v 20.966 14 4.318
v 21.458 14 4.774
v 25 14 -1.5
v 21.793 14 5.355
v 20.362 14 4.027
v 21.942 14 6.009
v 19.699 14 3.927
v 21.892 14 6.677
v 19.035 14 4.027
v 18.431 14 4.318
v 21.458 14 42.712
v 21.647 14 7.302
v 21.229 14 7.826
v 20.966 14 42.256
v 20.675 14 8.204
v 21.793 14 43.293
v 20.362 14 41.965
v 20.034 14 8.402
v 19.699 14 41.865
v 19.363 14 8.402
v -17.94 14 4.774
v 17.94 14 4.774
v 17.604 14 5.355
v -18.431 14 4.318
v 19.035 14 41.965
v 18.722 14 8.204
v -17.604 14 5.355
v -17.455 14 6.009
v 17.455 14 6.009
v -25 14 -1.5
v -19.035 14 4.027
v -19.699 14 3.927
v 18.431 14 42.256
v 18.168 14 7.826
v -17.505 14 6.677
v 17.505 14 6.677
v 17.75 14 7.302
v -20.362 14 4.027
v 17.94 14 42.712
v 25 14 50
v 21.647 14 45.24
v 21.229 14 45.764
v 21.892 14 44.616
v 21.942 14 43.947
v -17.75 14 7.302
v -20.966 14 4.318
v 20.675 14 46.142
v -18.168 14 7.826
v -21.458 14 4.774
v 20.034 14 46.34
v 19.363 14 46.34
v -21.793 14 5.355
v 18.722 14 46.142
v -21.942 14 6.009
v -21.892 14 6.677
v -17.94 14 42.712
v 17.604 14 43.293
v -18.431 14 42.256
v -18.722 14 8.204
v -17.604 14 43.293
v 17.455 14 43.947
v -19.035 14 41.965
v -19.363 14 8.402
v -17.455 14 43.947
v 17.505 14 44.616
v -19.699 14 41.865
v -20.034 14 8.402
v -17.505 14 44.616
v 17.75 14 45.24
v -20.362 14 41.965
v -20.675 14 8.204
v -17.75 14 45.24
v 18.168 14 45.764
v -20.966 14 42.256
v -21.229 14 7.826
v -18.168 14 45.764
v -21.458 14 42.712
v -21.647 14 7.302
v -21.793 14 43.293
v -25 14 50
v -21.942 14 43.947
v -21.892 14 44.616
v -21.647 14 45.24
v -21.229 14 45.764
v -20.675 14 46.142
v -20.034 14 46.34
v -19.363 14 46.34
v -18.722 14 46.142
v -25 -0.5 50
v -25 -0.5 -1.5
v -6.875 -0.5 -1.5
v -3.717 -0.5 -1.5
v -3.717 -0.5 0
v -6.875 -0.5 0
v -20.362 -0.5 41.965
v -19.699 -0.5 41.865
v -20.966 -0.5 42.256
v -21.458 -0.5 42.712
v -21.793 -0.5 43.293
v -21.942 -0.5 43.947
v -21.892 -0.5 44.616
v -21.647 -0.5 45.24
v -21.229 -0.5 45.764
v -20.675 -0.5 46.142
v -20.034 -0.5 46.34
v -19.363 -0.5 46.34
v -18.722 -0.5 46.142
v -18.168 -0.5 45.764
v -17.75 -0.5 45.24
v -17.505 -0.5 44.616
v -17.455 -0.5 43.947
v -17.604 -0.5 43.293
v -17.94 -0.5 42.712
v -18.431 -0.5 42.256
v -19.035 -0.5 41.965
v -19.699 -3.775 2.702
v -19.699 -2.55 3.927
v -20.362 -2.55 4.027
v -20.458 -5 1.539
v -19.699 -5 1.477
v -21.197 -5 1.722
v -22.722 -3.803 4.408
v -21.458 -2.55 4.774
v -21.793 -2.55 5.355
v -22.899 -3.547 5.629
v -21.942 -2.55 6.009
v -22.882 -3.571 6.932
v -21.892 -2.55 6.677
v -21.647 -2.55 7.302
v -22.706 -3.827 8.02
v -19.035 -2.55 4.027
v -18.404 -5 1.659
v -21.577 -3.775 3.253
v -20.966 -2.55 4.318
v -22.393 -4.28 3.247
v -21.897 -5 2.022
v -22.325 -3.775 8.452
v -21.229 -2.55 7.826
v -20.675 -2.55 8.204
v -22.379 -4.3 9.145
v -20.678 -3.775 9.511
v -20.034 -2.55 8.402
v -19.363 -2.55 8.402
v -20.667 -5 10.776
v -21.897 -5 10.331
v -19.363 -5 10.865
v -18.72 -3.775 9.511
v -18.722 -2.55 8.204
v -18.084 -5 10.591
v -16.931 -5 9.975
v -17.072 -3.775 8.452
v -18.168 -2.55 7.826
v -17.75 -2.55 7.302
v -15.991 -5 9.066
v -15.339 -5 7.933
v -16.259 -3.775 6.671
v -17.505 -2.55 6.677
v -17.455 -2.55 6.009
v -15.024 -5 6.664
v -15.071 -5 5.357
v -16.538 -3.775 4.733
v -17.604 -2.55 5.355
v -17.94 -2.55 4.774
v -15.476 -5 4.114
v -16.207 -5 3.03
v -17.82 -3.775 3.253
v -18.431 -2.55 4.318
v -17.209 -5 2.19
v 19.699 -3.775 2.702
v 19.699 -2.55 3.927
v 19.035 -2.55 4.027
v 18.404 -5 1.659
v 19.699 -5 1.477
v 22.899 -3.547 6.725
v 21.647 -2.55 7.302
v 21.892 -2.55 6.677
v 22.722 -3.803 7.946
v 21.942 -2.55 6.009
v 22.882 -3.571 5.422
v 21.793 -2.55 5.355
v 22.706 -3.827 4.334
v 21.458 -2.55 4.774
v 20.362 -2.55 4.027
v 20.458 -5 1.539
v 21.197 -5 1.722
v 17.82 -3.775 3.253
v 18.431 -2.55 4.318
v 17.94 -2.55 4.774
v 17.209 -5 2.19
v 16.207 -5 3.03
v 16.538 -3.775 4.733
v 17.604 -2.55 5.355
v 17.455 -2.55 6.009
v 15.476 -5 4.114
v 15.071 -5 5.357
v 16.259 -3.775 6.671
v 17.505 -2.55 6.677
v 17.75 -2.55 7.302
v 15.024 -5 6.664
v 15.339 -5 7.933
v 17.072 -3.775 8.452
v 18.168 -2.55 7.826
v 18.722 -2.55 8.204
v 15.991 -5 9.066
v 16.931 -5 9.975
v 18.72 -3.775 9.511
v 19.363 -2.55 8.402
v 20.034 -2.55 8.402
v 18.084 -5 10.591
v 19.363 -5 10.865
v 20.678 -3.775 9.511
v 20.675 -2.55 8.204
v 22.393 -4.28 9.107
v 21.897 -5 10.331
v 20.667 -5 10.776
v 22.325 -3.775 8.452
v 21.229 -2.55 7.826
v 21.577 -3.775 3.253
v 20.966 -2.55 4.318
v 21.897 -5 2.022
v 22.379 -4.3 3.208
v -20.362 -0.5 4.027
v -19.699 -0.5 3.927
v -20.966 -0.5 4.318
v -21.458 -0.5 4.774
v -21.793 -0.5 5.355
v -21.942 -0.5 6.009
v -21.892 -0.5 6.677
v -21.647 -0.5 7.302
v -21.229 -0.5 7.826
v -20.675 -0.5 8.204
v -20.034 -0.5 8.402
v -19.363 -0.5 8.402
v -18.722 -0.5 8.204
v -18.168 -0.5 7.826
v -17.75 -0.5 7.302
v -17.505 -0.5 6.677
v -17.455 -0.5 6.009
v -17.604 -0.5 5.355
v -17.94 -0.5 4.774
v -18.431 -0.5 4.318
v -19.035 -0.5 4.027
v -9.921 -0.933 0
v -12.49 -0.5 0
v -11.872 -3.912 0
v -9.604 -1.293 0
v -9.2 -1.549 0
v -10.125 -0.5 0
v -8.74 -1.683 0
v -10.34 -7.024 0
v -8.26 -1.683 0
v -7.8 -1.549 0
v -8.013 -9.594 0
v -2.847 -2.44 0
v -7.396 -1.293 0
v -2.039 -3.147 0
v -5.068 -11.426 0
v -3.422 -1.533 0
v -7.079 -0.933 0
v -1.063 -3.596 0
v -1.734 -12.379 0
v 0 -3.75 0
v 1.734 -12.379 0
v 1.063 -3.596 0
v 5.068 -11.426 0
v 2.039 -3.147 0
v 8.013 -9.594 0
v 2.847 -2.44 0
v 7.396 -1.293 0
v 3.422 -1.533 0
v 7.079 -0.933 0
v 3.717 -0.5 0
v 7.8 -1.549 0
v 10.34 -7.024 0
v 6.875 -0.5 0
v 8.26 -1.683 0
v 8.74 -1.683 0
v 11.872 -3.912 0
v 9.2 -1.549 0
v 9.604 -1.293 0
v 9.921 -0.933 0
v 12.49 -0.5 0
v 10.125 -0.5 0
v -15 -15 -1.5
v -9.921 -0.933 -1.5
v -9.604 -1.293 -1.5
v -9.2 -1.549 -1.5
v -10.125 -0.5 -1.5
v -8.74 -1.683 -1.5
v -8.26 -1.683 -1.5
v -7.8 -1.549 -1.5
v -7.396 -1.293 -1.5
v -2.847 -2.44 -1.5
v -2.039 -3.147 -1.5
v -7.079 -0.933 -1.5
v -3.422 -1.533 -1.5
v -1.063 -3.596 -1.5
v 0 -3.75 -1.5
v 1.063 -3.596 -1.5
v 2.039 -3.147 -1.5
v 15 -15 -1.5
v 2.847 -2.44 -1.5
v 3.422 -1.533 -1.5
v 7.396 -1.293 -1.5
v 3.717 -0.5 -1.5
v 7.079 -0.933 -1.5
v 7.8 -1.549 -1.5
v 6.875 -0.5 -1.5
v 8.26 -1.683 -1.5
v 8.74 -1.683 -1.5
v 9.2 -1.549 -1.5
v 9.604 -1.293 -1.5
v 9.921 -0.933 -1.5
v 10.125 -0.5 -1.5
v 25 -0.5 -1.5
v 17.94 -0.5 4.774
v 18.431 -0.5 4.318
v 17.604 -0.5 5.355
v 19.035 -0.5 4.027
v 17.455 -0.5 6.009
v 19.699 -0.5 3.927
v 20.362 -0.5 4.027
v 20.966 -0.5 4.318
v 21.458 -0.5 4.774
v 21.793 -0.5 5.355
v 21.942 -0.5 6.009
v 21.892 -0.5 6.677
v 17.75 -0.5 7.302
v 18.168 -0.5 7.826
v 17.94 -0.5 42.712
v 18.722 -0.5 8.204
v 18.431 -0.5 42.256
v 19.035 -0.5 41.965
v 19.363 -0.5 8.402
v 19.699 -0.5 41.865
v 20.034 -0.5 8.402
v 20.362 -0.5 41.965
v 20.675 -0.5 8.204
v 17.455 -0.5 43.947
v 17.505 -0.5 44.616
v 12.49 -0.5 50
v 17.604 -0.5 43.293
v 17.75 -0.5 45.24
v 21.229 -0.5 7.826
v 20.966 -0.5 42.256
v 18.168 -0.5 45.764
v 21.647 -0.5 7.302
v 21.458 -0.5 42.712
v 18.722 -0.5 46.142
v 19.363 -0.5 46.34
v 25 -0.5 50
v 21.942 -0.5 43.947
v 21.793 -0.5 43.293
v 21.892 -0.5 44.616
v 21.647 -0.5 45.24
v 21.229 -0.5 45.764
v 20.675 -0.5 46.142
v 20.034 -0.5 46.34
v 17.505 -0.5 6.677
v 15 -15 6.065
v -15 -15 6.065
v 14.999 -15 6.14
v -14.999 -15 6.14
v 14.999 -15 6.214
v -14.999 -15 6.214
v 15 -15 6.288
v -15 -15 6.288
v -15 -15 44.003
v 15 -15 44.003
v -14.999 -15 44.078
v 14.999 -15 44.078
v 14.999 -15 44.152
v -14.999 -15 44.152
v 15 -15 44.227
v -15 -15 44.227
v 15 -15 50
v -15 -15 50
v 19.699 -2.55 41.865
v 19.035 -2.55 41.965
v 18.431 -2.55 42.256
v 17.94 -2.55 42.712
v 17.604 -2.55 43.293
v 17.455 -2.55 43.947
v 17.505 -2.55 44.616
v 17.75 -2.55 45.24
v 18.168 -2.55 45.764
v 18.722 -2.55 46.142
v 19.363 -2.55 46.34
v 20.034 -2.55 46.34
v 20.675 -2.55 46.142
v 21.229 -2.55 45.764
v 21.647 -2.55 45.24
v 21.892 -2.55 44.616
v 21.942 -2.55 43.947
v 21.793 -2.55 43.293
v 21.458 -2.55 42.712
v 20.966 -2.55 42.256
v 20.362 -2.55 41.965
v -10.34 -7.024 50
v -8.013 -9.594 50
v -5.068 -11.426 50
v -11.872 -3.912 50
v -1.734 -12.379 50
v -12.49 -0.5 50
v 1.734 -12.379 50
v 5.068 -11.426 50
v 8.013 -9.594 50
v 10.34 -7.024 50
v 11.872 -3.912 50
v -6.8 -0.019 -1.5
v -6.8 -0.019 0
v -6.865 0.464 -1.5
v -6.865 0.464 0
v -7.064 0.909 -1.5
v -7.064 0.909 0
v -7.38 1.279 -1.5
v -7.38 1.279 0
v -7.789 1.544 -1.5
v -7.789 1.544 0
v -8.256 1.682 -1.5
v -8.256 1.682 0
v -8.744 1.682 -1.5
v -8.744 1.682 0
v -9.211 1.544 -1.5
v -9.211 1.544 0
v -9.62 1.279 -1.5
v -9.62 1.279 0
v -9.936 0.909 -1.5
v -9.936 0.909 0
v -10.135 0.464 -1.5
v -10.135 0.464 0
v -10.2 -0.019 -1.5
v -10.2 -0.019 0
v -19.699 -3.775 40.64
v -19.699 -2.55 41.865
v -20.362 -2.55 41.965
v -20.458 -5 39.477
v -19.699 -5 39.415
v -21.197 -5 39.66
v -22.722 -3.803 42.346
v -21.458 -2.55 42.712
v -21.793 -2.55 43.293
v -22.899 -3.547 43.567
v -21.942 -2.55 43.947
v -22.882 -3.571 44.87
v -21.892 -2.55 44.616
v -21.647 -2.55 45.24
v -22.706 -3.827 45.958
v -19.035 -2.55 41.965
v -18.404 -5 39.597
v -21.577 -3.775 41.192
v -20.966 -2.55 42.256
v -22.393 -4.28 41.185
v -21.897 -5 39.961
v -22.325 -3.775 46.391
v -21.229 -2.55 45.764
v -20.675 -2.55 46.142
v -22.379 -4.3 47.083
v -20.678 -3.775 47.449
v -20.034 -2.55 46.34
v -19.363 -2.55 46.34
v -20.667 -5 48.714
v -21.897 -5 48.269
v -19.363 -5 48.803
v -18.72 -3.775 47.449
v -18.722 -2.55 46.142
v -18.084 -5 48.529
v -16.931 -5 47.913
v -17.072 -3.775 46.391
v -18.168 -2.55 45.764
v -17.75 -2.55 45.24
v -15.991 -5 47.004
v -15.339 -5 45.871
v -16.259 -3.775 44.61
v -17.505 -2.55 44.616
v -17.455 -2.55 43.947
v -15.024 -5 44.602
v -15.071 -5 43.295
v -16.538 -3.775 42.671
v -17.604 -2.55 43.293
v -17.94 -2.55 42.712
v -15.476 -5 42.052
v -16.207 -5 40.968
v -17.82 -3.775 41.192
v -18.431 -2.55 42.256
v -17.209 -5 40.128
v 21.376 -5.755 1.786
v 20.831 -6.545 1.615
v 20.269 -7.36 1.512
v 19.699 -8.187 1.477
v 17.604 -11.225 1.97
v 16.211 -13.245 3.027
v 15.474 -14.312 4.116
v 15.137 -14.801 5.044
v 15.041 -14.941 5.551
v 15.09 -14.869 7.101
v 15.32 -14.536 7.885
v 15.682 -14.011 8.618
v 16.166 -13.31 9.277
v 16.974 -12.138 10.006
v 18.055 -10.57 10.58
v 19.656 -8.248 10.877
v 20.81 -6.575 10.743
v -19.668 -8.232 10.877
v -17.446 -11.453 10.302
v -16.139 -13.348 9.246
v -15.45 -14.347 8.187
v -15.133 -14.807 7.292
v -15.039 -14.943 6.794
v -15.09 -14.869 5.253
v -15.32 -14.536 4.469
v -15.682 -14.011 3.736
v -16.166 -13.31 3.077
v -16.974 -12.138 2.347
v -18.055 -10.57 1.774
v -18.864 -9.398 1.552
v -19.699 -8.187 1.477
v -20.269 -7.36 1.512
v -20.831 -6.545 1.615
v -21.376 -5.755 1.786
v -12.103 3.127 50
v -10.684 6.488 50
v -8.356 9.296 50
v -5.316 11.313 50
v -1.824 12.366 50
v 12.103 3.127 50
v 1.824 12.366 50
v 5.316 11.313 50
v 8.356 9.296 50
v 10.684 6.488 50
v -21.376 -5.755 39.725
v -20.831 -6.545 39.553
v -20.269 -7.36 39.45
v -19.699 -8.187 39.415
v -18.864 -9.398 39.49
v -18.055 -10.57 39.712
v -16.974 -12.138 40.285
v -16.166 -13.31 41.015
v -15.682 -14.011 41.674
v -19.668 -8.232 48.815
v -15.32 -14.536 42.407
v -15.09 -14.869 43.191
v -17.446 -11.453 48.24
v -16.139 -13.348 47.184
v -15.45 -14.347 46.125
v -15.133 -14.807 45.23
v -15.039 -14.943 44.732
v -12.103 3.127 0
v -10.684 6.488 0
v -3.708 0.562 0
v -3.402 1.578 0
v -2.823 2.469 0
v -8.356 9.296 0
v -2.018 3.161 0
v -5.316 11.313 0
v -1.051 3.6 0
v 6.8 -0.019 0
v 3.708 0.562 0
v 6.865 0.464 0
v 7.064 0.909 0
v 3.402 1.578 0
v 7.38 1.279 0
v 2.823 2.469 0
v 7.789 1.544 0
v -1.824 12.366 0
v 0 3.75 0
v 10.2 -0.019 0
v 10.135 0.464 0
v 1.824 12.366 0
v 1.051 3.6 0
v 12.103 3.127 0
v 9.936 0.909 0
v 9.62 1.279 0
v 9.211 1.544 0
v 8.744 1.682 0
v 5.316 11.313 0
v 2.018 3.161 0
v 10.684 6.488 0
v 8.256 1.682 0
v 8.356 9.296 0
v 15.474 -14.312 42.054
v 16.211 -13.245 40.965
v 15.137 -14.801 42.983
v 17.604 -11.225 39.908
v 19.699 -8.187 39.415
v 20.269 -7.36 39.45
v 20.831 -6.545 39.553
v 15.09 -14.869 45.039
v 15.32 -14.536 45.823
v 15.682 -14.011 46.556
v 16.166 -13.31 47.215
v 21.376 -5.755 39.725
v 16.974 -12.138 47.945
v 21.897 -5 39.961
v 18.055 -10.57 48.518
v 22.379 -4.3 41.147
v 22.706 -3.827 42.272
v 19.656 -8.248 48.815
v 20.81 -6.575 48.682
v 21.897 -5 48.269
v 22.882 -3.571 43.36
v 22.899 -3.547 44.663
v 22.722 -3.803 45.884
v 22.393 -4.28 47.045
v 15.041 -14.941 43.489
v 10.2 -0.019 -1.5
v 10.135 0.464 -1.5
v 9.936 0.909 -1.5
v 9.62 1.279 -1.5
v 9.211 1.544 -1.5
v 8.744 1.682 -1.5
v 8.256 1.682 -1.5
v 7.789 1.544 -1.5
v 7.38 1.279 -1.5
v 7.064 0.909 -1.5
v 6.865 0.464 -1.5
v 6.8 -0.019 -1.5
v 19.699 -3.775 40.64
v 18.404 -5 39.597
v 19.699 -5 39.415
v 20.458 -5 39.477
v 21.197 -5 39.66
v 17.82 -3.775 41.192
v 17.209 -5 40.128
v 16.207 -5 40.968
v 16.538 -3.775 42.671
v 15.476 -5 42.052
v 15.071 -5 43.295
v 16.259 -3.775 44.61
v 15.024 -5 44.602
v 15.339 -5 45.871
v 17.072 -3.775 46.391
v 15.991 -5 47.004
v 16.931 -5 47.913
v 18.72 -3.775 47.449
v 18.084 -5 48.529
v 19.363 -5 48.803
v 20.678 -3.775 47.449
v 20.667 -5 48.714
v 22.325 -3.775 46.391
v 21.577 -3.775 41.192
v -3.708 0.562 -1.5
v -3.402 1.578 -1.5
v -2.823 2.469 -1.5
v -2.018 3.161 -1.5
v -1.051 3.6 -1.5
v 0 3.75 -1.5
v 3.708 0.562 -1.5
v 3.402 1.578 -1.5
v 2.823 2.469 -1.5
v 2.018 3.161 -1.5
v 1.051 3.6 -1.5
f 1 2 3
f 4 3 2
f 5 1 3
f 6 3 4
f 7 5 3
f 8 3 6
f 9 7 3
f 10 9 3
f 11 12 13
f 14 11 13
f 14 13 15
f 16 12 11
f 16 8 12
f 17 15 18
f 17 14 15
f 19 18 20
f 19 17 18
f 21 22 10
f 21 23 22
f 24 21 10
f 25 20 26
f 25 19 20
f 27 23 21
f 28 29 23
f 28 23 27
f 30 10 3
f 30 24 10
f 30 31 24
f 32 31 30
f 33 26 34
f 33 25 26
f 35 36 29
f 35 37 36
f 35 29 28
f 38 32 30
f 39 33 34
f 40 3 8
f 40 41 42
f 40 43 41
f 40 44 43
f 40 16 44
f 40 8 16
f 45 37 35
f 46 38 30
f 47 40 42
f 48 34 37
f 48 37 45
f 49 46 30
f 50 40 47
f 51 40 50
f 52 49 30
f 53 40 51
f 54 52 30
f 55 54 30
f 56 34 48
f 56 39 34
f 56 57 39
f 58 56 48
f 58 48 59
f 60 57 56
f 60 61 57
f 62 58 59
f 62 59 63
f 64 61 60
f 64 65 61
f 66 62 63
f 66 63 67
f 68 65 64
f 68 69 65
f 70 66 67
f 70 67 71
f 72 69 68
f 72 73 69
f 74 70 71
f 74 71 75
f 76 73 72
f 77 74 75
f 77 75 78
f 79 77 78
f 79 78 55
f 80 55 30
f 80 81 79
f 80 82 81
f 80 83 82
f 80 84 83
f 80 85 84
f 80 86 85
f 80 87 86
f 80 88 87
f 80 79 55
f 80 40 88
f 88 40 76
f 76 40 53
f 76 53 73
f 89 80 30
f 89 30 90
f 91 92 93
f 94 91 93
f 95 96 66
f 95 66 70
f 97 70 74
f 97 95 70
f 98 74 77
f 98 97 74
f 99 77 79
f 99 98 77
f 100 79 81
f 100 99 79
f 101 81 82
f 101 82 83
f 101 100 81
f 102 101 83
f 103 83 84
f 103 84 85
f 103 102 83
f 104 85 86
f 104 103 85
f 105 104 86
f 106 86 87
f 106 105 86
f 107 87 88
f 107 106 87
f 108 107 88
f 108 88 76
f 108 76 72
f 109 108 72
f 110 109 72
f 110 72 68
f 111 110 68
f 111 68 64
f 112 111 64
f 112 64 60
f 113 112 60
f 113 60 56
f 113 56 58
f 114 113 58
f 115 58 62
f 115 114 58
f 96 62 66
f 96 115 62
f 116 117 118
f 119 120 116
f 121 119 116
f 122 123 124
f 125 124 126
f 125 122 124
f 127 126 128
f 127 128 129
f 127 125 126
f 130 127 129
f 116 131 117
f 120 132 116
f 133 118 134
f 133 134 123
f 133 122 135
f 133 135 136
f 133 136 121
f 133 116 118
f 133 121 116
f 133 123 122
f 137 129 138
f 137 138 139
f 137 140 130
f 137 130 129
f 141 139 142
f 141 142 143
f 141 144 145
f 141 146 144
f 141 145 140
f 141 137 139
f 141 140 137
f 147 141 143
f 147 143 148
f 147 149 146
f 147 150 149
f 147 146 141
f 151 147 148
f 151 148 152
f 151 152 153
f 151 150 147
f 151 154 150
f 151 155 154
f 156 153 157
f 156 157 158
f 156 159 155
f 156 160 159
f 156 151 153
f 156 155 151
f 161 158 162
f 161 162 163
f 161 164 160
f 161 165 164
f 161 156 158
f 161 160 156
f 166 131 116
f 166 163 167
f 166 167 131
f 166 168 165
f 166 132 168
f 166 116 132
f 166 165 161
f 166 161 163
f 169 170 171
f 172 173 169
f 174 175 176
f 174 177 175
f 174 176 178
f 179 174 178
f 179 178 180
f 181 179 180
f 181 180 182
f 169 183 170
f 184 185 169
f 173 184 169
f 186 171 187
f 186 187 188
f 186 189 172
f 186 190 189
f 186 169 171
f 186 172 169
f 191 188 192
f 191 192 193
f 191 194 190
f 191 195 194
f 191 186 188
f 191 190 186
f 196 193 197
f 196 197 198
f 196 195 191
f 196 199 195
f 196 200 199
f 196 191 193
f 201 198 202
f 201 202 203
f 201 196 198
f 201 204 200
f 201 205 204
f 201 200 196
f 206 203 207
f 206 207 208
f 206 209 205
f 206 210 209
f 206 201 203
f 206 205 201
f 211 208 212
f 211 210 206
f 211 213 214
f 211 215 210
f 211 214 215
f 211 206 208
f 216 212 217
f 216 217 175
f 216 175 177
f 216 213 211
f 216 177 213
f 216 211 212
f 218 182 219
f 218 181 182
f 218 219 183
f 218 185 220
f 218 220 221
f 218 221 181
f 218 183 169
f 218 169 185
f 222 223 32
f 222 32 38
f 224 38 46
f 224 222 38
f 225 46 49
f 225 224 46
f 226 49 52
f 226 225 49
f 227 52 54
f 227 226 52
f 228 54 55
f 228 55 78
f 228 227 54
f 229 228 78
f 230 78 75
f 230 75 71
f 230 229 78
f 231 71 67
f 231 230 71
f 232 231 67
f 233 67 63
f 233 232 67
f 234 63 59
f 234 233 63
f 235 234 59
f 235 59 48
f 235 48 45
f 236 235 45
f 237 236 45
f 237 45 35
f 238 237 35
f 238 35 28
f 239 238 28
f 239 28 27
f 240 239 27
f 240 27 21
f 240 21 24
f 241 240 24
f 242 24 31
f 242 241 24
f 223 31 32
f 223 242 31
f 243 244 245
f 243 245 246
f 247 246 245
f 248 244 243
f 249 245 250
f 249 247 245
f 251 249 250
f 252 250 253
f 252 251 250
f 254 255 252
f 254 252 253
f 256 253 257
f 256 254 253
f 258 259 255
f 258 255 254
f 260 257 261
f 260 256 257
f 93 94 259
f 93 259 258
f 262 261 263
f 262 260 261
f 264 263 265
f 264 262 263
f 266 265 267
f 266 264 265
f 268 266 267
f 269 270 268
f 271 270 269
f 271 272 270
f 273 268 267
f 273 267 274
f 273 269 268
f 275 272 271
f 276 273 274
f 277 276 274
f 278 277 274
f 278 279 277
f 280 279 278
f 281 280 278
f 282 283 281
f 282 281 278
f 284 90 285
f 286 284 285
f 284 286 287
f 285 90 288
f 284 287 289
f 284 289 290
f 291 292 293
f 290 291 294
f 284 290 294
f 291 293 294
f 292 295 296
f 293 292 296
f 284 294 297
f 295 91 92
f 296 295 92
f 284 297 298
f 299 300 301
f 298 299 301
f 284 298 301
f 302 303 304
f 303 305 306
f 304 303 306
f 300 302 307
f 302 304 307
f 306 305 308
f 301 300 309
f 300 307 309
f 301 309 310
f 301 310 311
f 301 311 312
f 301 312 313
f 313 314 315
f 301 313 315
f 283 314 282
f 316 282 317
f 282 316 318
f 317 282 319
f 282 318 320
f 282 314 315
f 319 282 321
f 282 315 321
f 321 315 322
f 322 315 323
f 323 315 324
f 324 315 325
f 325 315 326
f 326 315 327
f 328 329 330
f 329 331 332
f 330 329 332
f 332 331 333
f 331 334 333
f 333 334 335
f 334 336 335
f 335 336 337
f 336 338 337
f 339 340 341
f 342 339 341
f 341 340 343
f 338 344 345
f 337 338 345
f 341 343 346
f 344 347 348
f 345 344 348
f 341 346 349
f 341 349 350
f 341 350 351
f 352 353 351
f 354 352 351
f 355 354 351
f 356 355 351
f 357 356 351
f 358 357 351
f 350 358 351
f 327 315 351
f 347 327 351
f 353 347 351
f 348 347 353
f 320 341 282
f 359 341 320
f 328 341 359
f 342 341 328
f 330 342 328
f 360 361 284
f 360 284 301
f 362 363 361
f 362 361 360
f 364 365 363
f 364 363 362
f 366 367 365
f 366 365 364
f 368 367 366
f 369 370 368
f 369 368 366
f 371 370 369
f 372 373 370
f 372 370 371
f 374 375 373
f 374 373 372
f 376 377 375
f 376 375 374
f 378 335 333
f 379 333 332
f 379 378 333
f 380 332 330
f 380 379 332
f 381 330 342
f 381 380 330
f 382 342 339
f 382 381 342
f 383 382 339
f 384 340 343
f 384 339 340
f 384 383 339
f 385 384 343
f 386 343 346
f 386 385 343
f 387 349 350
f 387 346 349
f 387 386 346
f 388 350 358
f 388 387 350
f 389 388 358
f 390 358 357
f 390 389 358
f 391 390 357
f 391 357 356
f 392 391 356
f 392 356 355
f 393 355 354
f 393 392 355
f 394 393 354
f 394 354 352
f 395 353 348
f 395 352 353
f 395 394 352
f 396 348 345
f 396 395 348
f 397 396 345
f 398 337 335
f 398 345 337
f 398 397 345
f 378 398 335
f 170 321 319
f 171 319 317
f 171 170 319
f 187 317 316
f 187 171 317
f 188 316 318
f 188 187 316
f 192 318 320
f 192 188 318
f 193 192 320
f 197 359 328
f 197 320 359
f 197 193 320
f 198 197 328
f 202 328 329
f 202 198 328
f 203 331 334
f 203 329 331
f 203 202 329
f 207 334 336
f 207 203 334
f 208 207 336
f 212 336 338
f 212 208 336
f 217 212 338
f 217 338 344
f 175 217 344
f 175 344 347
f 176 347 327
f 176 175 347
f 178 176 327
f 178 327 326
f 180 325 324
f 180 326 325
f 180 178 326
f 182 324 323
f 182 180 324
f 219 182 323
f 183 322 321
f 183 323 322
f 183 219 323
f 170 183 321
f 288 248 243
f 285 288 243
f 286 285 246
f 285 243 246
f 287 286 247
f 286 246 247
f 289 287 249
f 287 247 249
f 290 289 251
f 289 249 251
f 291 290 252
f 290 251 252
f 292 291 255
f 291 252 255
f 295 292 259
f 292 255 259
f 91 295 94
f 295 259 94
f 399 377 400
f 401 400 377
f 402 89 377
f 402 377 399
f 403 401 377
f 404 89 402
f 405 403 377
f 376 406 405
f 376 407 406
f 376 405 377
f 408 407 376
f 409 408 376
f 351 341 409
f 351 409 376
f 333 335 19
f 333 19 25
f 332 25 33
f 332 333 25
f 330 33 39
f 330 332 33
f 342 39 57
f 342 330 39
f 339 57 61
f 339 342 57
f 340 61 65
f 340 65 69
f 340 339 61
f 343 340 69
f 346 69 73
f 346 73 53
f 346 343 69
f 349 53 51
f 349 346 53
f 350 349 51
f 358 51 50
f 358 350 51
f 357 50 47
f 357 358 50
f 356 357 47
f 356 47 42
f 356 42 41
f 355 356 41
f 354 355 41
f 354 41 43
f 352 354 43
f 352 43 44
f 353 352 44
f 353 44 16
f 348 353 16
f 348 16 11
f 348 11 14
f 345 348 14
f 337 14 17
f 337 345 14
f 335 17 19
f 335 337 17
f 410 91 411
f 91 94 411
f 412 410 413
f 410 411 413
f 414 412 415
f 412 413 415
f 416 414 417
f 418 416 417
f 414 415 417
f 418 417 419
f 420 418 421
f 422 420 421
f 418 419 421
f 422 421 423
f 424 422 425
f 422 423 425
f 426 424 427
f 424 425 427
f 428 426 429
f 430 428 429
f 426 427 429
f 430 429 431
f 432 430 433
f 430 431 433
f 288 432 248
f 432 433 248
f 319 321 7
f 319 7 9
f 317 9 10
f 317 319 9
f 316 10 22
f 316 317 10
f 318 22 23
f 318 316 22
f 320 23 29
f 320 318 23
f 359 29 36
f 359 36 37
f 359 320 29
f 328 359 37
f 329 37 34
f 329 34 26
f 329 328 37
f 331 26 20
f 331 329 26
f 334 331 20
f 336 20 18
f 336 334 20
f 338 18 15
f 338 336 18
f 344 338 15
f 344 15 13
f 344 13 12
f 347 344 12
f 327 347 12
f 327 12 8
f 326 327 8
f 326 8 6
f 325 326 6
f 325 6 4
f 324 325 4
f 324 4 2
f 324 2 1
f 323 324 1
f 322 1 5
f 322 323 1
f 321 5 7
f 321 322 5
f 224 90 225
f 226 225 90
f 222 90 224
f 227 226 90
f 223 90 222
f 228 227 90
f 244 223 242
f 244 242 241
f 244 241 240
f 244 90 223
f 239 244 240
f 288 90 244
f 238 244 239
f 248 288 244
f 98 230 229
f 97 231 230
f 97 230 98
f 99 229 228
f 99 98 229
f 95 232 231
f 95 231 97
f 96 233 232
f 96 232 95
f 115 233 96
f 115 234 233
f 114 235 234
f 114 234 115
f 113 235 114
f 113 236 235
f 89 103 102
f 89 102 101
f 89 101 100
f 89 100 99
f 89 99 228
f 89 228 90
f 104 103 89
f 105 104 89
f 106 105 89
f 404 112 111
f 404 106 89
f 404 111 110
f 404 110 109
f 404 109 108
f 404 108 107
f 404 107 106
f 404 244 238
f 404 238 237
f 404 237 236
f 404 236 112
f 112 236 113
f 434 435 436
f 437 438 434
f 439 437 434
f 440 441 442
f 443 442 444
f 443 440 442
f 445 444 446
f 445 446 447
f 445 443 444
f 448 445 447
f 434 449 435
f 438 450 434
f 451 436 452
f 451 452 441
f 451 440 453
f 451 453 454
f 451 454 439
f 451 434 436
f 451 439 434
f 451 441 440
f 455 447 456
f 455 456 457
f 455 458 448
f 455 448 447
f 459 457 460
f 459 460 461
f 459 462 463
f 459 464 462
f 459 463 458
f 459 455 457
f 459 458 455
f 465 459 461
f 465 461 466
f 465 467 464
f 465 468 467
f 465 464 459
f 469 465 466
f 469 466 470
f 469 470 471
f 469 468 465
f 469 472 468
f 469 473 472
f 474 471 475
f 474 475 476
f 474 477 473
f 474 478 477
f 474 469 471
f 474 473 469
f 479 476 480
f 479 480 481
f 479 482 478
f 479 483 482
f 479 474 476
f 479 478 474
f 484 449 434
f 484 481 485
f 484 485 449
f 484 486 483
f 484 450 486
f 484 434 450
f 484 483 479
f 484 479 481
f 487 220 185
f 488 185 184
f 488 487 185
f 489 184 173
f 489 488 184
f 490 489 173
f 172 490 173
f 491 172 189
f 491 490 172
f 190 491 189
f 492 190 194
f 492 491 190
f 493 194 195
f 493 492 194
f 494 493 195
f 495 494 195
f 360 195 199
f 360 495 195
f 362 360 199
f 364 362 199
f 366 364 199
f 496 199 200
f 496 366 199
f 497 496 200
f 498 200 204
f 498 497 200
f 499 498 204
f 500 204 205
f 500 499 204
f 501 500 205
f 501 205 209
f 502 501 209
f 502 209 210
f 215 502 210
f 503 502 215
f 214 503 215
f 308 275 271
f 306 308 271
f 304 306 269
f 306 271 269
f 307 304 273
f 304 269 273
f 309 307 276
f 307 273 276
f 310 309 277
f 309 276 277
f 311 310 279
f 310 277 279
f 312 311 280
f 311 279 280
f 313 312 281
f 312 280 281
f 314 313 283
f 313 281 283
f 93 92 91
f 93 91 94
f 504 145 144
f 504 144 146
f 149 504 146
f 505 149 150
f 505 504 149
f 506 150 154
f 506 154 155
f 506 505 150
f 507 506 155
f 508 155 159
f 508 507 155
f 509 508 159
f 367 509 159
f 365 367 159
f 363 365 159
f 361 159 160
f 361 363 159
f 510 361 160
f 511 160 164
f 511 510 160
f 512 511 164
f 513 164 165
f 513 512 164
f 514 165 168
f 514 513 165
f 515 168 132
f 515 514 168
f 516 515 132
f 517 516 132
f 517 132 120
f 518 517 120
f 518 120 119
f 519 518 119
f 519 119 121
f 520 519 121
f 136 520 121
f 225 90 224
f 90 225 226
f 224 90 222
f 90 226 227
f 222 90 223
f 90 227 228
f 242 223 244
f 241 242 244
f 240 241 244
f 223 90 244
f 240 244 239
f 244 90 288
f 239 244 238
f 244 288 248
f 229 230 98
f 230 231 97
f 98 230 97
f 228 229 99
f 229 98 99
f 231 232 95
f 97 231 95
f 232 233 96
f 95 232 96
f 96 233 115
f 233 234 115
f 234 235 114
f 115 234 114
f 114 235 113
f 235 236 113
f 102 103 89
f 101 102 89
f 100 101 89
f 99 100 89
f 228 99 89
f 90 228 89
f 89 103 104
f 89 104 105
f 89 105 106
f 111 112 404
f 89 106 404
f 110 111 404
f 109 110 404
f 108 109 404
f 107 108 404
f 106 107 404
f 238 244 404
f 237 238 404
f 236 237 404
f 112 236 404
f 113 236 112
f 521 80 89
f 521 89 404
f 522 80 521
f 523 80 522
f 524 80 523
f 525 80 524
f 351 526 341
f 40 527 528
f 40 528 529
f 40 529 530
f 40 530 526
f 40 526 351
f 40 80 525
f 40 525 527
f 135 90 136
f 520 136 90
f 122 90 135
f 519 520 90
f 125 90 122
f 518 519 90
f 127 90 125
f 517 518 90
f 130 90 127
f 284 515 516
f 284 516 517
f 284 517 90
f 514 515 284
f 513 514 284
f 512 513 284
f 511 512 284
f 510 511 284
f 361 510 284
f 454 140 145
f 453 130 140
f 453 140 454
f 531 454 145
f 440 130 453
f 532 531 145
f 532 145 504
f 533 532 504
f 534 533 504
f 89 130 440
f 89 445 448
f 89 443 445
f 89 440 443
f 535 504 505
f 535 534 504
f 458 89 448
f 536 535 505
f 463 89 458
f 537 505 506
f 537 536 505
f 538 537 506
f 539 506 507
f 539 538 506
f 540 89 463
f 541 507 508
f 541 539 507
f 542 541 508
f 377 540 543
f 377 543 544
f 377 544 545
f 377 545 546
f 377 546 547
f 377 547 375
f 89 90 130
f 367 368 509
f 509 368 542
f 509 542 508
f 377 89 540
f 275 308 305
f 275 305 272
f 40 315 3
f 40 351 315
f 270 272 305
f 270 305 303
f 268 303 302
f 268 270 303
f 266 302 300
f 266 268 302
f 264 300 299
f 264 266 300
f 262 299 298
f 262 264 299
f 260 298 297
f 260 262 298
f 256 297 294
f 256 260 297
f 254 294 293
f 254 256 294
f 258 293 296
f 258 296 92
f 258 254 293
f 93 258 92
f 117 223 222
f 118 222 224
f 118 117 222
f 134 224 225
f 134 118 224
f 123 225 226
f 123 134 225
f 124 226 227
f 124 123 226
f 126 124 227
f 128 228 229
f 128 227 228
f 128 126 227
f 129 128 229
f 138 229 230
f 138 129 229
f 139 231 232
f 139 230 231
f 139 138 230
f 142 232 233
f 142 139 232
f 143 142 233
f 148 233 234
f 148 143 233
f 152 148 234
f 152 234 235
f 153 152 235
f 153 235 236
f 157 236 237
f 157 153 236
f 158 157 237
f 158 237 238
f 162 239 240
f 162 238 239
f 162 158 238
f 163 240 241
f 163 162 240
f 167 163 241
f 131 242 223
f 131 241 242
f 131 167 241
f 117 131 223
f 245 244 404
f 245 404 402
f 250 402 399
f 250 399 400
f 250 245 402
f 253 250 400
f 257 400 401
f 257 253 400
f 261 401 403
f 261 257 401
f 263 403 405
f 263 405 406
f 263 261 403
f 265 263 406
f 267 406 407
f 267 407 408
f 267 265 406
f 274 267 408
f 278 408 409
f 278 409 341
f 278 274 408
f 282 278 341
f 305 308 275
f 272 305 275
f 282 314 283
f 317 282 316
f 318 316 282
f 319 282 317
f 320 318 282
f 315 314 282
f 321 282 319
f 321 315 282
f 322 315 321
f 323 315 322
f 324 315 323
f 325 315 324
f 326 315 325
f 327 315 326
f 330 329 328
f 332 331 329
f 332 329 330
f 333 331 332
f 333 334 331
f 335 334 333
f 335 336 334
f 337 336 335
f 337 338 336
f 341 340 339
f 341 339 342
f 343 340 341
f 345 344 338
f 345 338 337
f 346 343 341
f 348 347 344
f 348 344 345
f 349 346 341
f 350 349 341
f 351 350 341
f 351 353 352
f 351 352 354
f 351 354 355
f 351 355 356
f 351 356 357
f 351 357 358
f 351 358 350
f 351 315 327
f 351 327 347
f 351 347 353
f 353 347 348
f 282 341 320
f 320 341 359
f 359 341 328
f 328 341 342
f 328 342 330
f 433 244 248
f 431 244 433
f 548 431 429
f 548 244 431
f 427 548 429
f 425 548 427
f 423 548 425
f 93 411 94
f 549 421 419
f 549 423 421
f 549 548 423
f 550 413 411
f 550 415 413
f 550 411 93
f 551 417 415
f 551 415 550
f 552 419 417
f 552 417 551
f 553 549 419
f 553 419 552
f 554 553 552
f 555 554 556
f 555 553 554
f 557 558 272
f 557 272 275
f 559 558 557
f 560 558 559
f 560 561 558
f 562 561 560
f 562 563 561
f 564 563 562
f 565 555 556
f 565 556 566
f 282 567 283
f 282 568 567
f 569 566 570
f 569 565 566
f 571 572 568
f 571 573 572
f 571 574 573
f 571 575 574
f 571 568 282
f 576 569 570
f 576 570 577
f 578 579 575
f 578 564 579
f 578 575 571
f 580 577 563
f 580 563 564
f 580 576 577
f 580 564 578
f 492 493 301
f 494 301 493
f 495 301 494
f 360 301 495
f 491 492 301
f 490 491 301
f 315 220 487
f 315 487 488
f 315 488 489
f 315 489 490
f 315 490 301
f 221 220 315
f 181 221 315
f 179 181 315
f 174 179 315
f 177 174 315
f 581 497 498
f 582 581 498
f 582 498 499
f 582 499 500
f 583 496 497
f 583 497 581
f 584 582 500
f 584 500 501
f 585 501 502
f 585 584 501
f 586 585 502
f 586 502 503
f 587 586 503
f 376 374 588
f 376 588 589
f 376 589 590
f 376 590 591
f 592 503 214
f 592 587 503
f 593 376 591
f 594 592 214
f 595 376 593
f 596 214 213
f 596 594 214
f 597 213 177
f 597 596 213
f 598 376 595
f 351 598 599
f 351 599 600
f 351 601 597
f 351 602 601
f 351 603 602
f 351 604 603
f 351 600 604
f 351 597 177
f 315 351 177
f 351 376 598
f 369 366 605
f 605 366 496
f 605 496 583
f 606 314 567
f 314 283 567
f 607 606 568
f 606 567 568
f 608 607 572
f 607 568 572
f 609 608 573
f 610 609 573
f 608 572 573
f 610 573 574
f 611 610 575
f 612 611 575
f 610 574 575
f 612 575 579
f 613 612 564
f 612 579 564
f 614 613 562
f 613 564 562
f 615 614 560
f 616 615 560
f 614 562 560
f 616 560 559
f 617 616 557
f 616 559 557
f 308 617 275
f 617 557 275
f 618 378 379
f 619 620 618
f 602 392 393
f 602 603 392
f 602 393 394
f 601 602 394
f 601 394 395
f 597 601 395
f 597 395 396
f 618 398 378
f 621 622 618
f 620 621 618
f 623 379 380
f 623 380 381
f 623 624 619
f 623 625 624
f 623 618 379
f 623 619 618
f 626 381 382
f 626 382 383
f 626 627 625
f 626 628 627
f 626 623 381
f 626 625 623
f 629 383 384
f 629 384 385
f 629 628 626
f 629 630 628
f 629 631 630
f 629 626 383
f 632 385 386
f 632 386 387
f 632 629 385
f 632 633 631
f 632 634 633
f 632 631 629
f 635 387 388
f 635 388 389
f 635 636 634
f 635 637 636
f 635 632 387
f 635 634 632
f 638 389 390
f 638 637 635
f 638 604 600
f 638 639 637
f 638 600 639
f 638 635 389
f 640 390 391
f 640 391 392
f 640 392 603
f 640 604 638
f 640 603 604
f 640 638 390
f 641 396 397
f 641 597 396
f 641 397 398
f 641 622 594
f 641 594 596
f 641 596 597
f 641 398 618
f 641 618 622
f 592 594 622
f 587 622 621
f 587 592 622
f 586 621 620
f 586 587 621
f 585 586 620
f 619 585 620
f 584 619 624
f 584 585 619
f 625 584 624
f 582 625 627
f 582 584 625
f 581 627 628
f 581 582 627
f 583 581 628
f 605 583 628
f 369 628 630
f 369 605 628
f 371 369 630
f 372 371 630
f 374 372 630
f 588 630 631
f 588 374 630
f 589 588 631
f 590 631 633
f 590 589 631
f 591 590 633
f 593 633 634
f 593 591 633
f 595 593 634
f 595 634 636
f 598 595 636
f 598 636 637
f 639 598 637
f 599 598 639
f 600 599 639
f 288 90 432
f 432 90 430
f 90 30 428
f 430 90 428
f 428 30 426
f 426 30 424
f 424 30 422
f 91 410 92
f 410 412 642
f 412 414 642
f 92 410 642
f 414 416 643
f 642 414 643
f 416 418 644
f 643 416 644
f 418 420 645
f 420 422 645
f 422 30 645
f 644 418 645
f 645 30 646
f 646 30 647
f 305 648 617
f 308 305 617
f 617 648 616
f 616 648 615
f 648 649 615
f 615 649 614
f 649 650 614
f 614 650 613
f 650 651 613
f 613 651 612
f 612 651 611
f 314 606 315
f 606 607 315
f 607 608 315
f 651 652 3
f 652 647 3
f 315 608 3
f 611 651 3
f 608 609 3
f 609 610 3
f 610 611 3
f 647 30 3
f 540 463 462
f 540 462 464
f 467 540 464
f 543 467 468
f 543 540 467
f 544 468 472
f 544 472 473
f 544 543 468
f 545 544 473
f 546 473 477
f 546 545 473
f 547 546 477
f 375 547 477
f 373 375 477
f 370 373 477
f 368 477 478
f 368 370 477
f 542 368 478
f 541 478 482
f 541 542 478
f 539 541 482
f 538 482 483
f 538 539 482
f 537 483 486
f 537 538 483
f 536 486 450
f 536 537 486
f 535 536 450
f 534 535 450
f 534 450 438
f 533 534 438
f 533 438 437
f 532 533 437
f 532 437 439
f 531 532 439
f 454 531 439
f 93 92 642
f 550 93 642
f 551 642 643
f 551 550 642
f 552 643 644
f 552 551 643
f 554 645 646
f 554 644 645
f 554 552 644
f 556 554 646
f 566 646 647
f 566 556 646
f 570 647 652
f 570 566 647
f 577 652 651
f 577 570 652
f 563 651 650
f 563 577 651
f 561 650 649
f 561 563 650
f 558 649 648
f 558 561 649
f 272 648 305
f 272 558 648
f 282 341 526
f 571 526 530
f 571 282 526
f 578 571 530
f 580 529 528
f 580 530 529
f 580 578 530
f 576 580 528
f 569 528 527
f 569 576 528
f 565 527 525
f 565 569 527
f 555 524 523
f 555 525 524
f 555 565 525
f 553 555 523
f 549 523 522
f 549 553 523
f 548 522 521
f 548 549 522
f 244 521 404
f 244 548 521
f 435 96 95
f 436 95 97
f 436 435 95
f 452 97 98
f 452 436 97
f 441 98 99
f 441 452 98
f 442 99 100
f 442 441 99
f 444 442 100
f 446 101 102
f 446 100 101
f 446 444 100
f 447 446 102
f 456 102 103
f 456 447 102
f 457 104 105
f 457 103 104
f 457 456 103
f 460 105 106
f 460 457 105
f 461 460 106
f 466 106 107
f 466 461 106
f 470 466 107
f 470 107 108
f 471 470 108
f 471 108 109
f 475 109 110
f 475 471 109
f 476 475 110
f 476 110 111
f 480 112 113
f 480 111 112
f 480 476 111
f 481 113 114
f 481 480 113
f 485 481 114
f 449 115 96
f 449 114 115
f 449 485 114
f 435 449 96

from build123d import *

# Parameters (mm, degrees)
ESQUISSE1_W                                 = 10
ESQUISSE1_H                                 = 14.5
ESQUISSE1_W_2                               = 30
ESQUISSE1_H_2                               = 29
ESQUISSE1_R                                 = 12.5
BOSS_EXTRU_1_DEPTH                          = 50
FRAISAGE_POUR_VIS_T_TE_FRAIS_E_M41_AT_COUNT = 2
FRAISAGE_POUR_VIS_T_TE_FRAIS_E_M41_AT_PITCH = 39.397349882
FRAISAGE_POUR_VIS_T_TE_FRAIS_E_M41_2_COUNT  = 2
FRAISAGE_POUR_VIS_T_TE_FRAIS_E_M41_2_PITCH  = 54.694216744
FRAISAGE_POUR_VIS_T_TE_FRAIS_E_M41_3_COUNT  = 2
FRAISAGE_POUR_VIS_T_TE_FRAIS_E_M41_3_PITCH  = 37.938188775
ESQUISSE26_R                                = 3.75
BOSS_EXTRU_2_DEPTH                          = 1.5
D_GAGEMENT_M31_D                            = 3.4


with BuildPart() as part:
    # Esquisse1 → Boss.-Extru.1 (new body)
    # profile 1 of 5: a face of its own
    with BuildSketch(Plane.XY):
        with Locations((-20, 6.75)):
            Rectangle(ESQUISSE1_W, ESQUISSE1_H)
    # profile 2 of 5: a face of its own
    with BuildSketch(Plane.XY):
        Polygon((-15, -15), (-15, -0.5), (-25, -0.5), align=None)
    # profile 3 of 5: a face of its own
    with BuildSketch(Plane.XY):
        with Locations((0, -0.5)):
            Rectangle(ESQUISSE1_W_2, ESQUISSE1_H_2)
        Circle(ESQUISSE1_R, mode=Mode.SUBTRACT)
    # profile 4 of 5: a face of its own
    with BuildSketch(Plane.XY):
        Polygon((25, -0.5), (15, -0.5), (15, -15), align=None)
    # profile 5 of 5: a face of its own
    with BuildSketch(Plane.XY):
        with Locations((20, 6.75)):
            Rectangle(ESQUISSE1_W, ESQUISSE1_H)
    extrude(amount=BOSS_EXTRU_1_DEPTH)

    # Esquisse25 → Fraisage pour vis à tête fraisée M41 (revolve, cut)
    with BuildSketch(Plane(origin=(19.698674941, -15, 6.176821723), x_dir=(0, 0, -1), z_dir=(1, 0, 0))):
        Polygon((0, 0), (0, 29), (2.25, 29), (2.25, 12.45), (4.7, 10), (4.7, 0), align=None)
    fraisage_pour_vis_t_te_frais_e_m41 = revolve(axis=Axis((19.698674941, -21.35, 6.176821723), (0, 1, 0)), mode=Mode.SUBTRACT)

    # Fraisage pour vis à tête fraisée M41 at: Fraisage pour vis à tête fraisée M41 ×2
    with Locations(*[(-i * FRAISAGE_POUR_VIS_T_TE_FRAIS_E_M41_AT_PITCH, 0, 0) for i in range(1, FRAISAGE_POUR_VIS_T_TE_FRAIS_E_M41_AT_COUNT)]):
        add(fraisage_pour_vis_t_te_frais_e_m41, mode=Mode.SUBTRACT)

    # Fraisage pour vis _ t_te frais_e M41 2: Fraisage pour vis à tête fraisée M41 ×2
    with Locations(*[Vector(-0.7203202134914811, 0, 0.6936416870658707) * (i * FRAISAGE_POUR_VIS_T_TE_FRAIS_E_M41_2_PITCH) for i in range(1, FRAISAGE_POUR_VIS_T_TE_FRAIS_E_M41_2_COUNT)]):
        add(fraisage_pour_vis_t_te_frais_e_m41, mode=Mode.SUBTRACT)

    # Fraisage pour vis _ t_te frais_e M41 3: Fraisage pour vis à tête fraisée M41 ×2
    with Locations(*[(0, 0, i * FRAISAGE_POUR_VIS_T_TE_FRAIS_E_M41_3_PITCH) for i in range(1, FRAISAGE_POUR_VIS_T_TE_FRAIS_E_M41_3_COUNT)]):
        add(fraisage_pour_vis_t_te_frais_e_m41, mode=Mode.SUBTRACT)

    # Esquisse26 → Boss.-Extru.2 (add)
    with BuildSketch(Plane(origin=(0, 0, 0), x_dir=(-1, 0, 0), z_dir=(0, 0, -1))):
        Polygon((-25, 14), (25, 14), (25, -0.5), (15, -15), (-15, -15), (-25, -0.5), align=None)
        Circle(ESQUISSE26_R, mode=Mode.SUBTRACT)
    extrude(amount=BOSS_EXTRU_2_DEPTH)

    # Dégagement M31 (through all)
    with Locations(Plane(origin=(0, 0, -1.5), x_dir=(-1, 0, 0), z_dir=(0, 0, -1))):
        with Locations((-8.5, 0), (8.5, 0)):
            Hole(D_GAGEMENT_M31_D / 2)


with BuildPart() as body_2:
    # Fractionner1: the piece on the far side of the plane
    add(part.part)
    split(bisect_by=Plane.ZX.offset(-0.5), keep=Keep.BOTTOM)


with BuildPart() as part_1:
    add(part.part)

    # Fractionner1
    split(bisect_by=Plane.ZX.offset(-0.5), keep=Keep.TOP)


solid = Compound([body_2.part, part_1.part])
